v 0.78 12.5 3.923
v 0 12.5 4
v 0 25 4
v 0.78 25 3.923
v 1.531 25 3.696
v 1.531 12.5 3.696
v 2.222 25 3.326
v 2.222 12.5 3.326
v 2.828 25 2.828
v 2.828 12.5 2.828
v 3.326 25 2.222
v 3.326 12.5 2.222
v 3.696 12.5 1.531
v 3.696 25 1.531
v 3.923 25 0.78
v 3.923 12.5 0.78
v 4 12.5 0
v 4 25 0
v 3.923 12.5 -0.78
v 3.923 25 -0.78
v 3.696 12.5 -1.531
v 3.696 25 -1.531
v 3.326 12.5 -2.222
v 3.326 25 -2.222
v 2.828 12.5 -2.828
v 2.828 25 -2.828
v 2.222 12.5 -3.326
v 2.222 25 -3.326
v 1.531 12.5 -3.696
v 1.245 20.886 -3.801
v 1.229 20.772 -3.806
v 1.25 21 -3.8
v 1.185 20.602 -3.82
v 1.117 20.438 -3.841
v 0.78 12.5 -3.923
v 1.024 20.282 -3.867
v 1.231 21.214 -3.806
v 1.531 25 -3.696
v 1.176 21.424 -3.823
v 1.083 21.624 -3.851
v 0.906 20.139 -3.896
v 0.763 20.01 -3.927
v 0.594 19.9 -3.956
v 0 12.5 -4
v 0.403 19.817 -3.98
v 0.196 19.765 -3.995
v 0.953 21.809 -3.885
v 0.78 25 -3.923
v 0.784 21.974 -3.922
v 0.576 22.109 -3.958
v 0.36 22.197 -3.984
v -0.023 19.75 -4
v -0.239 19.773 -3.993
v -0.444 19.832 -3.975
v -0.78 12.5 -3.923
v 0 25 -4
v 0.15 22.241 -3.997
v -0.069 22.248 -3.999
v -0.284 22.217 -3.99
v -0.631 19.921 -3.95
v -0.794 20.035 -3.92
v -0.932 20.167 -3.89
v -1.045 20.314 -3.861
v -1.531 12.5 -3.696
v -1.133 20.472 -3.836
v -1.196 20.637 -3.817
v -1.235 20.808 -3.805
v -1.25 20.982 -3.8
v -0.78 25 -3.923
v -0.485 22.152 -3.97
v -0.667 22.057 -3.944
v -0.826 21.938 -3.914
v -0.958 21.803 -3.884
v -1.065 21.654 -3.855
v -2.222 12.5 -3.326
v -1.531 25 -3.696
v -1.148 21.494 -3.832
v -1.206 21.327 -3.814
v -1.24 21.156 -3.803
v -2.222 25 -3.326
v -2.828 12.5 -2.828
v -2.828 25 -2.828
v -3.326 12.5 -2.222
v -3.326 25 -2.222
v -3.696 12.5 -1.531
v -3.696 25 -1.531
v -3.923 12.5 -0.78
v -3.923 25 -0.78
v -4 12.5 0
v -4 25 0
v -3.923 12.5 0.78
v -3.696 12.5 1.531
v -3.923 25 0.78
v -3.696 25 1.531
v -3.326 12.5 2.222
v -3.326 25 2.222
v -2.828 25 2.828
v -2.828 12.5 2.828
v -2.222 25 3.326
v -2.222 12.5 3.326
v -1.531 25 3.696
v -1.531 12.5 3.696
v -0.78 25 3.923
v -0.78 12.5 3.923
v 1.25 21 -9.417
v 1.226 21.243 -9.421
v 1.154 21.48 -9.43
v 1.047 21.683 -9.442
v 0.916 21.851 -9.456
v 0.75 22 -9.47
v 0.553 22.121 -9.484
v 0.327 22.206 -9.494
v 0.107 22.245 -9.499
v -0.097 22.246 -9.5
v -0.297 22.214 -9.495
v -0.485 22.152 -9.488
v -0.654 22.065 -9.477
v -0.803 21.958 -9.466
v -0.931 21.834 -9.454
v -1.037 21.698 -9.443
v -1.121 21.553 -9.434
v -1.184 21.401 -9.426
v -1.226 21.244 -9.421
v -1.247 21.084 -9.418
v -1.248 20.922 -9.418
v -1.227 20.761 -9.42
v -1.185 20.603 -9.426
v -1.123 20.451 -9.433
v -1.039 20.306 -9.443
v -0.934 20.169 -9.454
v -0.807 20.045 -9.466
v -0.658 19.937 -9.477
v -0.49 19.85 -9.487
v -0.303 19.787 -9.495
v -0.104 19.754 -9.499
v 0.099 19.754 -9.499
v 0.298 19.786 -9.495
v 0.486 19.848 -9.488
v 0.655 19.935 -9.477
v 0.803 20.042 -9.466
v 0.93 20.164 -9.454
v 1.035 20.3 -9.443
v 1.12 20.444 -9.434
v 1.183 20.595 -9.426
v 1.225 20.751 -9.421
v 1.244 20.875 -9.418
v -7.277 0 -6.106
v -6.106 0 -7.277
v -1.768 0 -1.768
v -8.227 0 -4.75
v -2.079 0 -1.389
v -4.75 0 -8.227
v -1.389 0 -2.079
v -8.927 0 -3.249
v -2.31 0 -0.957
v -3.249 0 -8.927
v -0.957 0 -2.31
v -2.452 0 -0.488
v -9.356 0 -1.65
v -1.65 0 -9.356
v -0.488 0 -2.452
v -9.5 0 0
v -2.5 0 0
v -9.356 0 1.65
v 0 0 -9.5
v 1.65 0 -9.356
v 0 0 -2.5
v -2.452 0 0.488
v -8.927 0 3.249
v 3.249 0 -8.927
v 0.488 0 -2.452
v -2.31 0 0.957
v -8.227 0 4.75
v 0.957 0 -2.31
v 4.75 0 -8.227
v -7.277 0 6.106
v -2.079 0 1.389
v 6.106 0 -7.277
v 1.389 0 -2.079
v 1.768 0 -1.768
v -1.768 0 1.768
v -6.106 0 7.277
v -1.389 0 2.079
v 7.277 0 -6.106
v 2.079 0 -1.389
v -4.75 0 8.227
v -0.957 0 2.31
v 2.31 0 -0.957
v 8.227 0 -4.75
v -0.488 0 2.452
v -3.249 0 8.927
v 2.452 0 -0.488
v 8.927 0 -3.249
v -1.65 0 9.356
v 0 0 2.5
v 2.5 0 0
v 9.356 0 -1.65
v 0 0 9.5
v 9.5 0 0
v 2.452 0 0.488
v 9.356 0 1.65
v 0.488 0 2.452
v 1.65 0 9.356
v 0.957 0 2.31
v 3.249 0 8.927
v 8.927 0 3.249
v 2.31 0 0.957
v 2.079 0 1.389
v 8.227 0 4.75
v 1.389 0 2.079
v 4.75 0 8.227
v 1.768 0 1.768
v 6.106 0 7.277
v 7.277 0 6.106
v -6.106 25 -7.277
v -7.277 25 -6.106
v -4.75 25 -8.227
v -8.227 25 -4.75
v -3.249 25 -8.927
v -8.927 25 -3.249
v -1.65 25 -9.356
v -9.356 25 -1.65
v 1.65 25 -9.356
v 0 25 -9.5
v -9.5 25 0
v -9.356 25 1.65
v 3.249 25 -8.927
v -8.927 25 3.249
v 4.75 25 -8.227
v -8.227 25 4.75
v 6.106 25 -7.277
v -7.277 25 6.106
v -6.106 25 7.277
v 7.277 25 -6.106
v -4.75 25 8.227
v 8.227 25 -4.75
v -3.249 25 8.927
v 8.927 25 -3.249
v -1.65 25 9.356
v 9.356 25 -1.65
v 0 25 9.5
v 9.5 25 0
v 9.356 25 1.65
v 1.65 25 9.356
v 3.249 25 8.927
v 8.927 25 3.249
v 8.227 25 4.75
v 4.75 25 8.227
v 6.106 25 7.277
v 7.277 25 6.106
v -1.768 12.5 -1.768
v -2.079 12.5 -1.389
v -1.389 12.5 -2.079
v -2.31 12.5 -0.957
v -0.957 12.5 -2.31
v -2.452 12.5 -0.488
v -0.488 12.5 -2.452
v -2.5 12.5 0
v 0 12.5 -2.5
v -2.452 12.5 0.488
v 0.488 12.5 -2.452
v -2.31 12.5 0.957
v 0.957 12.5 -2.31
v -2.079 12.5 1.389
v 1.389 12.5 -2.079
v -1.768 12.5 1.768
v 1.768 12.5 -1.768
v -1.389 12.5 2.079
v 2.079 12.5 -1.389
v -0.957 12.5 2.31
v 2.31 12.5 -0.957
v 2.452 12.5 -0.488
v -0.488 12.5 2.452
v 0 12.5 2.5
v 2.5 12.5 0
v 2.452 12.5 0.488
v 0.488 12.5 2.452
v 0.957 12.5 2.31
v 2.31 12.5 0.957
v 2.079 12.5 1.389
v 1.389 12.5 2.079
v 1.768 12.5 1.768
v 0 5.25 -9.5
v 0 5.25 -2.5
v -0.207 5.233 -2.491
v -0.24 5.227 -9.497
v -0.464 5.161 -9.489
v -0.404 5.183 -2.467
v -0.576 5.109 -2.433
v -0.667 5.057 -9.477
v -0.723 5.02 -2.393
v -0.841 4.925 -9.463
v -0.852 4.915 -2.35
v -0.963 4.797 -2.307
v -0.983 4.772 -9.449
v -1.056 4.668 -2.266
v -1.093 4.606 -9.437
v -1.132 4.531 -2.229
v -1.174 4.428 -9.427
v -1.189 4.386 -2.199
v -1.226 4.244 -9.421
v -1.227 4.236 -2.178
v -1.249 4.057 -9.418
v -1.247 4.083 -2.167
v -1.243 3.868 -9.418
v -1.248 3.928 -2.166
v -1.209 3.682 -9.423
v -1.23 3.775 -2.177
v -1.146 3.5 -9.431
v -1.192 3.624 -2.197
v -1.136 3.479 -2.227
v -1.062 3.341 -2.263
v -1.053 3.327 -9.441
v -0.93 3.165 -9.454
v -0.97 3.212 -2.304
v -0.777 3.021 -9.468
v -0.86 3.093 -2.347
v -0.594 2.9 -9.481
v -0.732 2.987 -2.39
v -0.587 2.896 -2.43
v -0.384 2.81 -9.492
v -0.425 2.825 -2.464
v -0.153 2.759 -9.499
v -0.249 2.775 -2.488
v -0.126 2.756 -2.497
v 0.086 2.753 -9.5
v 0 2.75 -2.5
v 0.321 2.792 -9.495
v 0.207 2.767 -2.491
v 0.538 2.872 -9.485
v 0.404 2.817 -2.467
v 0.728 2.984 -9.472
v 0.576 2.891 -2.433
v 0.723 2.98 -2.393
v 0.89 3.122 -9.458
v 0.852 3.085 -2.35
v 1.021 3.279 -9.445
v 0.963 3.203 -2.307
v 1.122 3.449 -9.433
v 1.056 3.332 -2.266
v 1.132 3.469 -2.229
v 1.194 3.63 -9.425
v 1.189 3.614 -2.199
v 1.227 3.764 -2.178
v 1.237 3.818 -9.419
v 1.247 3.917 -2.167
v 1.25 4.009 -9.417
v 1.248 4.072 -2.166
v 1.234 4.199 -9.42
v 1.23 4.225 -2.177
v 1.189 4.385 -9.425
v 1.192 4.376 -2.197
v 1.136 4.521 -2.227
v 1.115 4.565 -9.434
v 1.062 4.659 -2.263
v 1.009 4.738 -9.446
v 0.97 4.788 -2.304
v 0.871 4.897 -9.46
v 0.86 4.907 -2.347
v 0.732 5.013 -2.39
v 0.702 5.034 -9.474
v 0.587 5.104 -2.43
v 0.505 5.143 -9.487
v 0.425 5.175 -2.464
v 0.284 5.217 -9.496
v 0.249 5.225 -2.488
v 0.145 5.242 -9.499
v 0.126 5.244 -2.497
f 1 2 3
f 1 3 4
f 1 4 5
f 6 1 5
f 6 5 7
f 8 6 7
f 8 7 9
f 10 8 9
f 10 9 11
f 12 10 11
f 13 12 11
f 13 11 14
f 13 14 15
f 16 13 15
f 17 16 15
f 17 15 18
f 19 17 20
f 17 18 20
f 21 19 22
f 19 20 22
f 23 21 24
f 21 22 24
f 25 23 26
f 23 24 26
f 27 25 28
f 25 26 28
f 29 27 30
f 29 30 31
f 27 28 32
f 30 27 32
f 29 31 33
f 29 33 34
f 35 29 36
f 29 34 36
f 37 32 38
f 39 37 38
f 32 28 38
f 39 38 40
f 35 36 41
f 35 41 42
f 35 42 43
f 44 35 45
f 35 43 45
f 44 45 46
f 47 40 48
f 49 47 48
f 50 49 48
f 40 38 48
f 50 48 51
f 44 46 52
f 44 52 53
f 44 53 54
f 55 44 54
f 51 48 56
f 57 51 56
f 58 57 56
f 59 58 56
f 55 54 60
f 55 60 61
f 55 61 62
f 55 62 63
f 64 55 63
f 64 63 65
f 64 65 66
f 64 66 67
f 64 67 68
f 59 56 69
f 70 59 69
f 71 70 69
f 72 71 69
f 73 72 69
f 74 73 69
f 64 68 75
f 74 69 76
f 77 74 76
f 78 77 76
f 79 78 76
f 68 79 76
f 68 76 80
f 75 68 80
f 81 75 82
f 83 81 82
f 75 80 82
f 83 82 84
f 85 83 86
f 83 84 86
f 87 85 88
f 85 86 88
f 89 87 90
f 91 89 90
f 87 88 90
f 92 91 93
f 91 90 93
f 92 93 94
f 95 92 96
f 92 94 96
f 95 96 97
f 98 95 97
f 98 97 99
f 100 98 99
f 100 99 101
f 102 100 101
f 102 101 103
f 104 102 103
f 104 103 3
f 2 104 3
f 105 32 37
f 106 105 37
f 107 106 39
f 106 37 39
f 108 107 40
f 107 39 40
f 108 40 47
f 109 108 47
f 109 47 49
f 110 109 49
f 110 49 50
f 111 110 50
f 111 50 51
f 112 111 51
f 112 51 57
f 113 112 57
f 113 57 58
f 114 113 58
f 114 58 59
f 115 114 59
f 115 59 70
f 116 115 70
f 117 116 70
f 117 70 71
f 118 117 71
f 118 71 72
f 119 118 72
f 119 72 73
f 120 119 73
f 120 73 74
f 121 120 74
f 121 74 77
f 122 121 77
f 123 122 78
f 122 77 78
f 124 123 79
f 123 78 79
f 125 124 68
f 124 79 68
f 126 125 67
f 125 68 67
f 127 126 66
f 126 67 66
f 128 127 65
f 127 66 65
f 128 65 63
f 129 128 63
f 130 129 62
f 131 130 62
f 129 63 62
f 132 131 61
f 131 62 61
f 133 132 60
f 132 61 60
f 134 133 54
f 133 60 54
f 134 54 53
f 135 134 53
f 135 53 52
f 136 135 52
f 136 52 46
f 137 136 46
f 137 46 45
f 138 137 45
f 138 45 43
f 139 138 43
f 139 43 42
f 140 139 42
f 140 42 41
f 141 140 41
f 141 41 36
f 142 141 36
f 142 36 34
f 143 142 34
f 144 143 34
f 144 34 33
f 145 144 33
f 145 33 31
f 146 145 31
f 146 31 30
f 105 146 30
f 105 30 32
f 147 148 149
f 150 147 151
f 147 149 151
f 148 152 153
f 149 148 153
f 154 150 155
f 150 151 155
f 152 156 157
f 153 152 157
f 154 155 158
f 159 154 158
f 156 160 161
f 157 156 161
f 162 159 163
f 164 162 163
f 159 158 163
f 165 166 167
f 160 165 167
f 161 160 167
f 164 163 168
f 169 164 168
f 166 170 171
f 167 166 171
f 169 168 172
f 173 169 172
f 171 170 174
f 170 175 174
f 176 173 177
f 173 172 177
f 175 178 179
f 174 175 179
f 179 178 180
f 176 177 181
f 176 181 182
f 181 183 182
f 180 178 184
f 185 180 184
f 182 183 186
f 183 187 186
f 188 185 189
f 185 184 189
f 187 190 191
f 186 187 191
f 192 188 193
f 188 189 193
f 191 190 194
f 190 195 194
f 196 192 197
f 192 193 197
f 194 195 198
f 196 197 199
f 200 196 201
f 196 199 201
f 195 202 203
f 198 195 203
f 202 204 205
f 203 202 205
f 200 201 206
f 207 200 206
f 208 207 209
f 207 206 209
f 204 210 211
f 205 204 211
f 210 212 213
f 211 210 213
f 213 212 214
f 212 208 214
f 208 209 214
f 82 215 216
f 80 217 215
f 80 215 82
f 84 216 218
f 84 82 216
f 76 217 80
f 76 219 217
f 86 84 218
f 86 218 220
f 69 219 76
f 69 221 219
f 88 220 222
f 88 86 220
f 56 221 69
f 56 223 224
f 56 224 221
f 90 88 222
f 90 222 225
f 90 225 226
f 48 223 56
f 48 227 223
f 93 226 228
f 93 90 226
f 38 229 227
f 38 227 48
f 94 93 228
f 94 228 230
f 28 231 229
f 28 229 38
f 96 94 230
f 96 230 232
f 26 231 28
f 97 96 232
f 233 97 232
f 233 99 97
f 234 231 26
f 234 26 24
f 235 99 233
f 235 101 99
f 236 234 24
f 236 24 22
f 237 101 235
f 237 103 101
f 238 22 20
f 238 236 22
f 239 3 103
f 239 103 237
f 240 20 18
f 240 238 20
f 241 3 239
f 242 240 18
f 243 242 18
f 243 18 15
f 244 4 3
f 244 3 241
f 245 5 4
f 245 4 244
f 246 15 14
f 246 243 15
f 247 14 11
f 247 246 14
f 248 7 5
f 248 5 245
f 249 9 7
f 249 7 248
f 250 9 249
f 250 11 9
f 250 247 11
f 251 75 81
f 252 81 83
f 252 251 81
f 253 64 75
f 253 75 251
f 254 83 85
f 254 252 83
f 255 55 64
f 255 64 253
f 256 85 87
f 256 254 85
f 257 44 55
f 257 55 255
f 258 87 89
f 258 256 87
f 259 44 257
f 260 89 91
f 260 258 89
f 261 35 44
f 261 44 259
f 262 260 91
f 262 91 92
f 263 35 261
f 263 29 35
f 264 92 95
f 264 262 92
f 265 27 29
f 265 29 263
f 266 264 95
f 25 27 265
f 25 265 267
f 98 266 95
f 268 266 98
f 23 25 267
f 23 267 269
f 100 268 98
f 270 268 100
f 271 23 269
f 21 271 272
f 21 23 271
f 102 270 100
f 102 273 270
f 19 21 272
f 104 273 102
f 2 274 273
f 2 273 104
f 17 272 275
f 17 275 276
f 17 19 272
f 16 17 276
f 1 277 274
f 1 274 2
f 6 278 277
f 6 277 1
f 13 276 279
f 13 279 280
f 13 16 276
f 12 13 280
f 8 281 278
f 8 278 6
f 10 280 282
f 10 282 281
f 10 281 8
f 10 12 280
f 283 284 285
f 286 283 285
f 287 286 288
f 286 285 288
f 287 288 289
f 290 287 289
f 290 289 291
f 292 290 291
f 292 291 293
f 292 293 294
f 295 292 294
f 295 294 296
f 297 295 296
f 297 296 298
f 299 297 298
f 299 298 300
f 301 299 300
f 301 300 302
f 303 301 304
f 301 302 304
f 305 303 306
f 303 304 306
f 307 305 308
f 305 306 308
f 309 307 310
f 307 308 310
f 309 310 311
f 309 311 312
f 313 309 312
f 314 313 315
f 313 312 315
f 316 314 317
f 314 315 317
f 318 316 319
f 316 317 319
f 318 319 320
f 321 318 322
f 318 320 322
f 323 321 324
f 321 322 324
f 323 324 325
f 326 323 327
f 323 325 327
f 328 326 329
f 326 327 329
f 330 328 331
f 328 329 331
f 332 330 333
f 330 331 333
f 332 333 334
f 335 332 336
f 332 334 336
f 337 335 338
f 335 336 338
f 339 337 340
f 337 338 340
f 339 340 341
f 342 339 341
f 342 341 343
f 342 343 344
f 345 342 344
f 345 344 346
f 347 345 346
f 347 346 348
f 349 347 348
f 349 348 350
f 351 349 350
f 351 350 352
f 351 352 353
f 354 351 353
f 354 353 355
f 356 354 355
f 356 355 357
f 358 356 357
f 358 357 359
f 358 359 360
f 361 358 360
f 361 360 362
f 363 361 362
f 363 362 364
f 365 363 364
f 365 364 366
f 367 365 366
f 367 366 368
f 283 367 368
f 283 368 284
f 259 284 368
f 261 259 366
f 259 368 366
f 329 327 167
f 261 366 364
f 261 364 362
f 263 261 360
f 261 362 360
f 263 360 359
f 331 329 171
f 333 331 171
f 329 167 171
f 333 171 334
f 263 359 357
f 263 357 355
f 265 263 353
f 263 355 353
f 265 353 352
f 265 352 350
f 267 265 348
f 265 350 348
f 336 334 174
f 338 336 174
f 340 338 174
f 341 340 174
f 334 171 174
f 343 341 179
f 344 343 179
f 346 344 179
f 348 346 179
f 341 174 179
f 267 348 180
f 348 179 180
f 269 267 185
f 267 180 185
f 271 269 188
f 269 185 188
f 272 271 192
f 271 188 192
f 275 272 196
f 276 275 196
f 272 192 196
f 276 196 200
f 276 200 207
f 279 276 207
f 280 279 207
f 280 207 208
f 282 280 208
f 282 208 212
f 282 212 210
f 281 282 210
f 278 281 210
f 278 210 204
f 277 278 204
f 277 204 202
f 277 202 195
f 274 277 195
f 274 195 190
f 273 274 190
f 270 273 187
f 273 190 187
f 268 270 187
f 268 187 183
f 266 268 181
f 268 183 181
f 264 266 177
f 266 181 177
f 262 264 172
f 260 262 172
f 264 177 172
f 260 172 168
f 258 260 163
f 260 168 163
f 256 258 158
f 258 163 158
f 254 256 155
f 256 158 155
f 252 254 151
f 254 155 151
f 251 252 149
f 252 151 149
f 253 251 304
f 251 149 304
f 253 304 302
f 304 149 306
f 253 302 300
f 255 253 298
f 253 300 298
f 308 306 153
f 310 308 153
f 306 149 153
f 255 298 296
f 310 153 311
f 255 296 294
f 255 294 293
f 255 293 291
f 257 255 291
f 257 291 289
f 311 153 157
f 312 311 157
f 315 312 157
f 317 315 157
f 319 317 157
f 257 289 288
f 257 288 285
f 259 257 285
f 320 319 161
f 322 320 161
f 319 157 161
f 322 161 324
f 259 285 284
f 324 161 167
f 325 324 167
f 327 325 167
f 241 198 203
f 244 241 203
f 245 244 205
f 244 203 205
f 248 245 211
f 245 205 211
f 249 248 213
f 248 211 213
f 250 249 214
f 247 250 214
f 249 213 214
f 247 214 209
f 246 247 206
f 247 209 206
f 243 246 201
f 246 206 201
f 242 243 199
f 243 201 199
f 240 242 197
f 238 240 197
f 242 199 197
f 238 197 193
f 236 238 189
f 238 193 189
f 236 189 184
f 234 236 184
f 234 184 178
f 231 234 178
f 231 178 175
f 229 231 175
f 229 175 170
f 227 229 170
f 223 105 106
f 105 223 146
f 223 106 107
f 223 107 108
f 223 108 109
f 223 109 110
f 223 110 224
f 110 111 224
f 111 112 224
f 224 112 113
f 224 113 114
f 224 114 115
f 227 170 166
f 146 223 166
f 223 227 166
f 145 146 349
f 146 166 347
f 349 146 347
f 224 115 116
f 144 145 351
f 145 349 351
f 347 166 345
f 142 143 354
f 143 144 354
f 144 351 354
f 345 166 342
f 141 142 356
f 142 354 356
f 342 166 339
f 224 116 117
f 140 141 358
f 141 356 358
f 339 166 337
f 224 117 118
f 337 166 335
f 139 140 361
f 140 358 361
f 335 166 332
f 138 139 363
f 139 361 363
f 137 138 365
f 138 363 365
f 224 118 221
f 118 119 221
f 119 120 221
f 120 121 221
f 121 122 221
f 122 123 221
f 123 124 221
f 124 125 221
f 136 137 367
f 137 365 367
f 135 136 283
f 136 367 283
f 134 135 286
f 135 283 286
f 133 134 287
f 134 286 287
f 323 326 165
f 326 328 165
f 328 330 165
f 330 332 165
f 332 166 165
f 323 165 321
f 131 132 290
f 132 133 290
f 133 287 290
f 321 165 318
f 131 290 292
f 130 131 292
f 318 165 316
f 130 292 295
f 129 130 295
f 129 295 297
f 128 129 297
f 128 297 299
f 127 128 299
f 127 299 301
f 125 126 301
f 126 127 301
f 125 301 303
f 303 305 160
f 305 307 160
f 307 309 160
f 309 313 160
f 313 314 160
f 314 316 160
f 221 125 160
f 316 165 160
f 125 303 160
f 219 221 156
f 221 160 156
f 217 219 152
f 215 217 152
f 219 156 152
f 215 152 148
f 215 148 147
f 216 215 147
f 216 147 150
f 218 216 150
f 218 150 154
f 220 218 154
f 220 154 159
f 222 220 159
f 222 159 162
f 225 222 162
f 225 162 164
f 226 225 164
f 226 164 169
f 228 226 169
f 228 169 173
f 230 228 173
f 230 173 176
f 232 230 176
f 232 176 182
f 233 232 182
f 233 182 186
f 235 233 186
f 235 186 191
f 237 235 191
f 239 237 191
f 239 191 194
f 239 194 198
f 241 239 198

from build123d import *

# Parameters (mm, degrees)
SKETCH1_R           = 9.5
BOSS_EXTRUDE1_DEPTH = 25
SKETCH2_R           = 4
CUT_EXTRUDE1_DEPTH  = 12.5
SKETCH3_R           = 2.5
CUT_EXTRUDE2_DEPTH  = 12.5
SKETCH4_R           = 1.25
CUT_EXTRUDE3_DEPTH  = 12.5


with BuildPart() as part:
    # Sketch1 → Boss-Extrude1 (new body)
    with BuildSketch(Plane(origin=(0, 0, 0), x_dir=(1, 0, 0), z_dir=(0, 1, 0))):
        with Locations(Location((0, 0, 0), (0, 0, 270))):
            Circle(SKETCH1_R)
    extrude(amount=BOSS_EXTRUDE1_DEPTH)

    # Sketch2 → Cut-Extrude1 (cut)
    with BuildSketch(Plane(origin=(0, 25, 0), x_dir=(1, 0, 0), z_dir=(0, 1, 0))):
        with Locations(Location((0, 0, 0), (0, 0, 270))):
            Circle(SKETCH2_R)
    extrude(amount=-CUT_EXTRUDE1_DEPTH, mode=Mode.SUBTRACT)

    # Sketch3 → Cut-Extrude2 (cut)
    with BuildSketch(Plane.XZ):
        with Locations(Location((0, 0, 0), (0, 0, 270))):
            Circle(SKETCH3_R)
    extrude(amount=-CUT_EXTRUDE2_DEPTH, mode=Mode.SUBTRACT)

    # Sketch4 → Cut-Extrude3 (cut)
    with BuildSketch(Plane.XY):
        with Locations(Location((0, 4, 0), (0, 0, 90))):
            Circle(SKETCH4_R)
        with Locations((0, 21)):
            Circle(SKETCH4_R)
    extrude(amount=-CUT_EXTRUDE3_DEPTH, mode=Mode.SUBTRACT)


solid = part.part
